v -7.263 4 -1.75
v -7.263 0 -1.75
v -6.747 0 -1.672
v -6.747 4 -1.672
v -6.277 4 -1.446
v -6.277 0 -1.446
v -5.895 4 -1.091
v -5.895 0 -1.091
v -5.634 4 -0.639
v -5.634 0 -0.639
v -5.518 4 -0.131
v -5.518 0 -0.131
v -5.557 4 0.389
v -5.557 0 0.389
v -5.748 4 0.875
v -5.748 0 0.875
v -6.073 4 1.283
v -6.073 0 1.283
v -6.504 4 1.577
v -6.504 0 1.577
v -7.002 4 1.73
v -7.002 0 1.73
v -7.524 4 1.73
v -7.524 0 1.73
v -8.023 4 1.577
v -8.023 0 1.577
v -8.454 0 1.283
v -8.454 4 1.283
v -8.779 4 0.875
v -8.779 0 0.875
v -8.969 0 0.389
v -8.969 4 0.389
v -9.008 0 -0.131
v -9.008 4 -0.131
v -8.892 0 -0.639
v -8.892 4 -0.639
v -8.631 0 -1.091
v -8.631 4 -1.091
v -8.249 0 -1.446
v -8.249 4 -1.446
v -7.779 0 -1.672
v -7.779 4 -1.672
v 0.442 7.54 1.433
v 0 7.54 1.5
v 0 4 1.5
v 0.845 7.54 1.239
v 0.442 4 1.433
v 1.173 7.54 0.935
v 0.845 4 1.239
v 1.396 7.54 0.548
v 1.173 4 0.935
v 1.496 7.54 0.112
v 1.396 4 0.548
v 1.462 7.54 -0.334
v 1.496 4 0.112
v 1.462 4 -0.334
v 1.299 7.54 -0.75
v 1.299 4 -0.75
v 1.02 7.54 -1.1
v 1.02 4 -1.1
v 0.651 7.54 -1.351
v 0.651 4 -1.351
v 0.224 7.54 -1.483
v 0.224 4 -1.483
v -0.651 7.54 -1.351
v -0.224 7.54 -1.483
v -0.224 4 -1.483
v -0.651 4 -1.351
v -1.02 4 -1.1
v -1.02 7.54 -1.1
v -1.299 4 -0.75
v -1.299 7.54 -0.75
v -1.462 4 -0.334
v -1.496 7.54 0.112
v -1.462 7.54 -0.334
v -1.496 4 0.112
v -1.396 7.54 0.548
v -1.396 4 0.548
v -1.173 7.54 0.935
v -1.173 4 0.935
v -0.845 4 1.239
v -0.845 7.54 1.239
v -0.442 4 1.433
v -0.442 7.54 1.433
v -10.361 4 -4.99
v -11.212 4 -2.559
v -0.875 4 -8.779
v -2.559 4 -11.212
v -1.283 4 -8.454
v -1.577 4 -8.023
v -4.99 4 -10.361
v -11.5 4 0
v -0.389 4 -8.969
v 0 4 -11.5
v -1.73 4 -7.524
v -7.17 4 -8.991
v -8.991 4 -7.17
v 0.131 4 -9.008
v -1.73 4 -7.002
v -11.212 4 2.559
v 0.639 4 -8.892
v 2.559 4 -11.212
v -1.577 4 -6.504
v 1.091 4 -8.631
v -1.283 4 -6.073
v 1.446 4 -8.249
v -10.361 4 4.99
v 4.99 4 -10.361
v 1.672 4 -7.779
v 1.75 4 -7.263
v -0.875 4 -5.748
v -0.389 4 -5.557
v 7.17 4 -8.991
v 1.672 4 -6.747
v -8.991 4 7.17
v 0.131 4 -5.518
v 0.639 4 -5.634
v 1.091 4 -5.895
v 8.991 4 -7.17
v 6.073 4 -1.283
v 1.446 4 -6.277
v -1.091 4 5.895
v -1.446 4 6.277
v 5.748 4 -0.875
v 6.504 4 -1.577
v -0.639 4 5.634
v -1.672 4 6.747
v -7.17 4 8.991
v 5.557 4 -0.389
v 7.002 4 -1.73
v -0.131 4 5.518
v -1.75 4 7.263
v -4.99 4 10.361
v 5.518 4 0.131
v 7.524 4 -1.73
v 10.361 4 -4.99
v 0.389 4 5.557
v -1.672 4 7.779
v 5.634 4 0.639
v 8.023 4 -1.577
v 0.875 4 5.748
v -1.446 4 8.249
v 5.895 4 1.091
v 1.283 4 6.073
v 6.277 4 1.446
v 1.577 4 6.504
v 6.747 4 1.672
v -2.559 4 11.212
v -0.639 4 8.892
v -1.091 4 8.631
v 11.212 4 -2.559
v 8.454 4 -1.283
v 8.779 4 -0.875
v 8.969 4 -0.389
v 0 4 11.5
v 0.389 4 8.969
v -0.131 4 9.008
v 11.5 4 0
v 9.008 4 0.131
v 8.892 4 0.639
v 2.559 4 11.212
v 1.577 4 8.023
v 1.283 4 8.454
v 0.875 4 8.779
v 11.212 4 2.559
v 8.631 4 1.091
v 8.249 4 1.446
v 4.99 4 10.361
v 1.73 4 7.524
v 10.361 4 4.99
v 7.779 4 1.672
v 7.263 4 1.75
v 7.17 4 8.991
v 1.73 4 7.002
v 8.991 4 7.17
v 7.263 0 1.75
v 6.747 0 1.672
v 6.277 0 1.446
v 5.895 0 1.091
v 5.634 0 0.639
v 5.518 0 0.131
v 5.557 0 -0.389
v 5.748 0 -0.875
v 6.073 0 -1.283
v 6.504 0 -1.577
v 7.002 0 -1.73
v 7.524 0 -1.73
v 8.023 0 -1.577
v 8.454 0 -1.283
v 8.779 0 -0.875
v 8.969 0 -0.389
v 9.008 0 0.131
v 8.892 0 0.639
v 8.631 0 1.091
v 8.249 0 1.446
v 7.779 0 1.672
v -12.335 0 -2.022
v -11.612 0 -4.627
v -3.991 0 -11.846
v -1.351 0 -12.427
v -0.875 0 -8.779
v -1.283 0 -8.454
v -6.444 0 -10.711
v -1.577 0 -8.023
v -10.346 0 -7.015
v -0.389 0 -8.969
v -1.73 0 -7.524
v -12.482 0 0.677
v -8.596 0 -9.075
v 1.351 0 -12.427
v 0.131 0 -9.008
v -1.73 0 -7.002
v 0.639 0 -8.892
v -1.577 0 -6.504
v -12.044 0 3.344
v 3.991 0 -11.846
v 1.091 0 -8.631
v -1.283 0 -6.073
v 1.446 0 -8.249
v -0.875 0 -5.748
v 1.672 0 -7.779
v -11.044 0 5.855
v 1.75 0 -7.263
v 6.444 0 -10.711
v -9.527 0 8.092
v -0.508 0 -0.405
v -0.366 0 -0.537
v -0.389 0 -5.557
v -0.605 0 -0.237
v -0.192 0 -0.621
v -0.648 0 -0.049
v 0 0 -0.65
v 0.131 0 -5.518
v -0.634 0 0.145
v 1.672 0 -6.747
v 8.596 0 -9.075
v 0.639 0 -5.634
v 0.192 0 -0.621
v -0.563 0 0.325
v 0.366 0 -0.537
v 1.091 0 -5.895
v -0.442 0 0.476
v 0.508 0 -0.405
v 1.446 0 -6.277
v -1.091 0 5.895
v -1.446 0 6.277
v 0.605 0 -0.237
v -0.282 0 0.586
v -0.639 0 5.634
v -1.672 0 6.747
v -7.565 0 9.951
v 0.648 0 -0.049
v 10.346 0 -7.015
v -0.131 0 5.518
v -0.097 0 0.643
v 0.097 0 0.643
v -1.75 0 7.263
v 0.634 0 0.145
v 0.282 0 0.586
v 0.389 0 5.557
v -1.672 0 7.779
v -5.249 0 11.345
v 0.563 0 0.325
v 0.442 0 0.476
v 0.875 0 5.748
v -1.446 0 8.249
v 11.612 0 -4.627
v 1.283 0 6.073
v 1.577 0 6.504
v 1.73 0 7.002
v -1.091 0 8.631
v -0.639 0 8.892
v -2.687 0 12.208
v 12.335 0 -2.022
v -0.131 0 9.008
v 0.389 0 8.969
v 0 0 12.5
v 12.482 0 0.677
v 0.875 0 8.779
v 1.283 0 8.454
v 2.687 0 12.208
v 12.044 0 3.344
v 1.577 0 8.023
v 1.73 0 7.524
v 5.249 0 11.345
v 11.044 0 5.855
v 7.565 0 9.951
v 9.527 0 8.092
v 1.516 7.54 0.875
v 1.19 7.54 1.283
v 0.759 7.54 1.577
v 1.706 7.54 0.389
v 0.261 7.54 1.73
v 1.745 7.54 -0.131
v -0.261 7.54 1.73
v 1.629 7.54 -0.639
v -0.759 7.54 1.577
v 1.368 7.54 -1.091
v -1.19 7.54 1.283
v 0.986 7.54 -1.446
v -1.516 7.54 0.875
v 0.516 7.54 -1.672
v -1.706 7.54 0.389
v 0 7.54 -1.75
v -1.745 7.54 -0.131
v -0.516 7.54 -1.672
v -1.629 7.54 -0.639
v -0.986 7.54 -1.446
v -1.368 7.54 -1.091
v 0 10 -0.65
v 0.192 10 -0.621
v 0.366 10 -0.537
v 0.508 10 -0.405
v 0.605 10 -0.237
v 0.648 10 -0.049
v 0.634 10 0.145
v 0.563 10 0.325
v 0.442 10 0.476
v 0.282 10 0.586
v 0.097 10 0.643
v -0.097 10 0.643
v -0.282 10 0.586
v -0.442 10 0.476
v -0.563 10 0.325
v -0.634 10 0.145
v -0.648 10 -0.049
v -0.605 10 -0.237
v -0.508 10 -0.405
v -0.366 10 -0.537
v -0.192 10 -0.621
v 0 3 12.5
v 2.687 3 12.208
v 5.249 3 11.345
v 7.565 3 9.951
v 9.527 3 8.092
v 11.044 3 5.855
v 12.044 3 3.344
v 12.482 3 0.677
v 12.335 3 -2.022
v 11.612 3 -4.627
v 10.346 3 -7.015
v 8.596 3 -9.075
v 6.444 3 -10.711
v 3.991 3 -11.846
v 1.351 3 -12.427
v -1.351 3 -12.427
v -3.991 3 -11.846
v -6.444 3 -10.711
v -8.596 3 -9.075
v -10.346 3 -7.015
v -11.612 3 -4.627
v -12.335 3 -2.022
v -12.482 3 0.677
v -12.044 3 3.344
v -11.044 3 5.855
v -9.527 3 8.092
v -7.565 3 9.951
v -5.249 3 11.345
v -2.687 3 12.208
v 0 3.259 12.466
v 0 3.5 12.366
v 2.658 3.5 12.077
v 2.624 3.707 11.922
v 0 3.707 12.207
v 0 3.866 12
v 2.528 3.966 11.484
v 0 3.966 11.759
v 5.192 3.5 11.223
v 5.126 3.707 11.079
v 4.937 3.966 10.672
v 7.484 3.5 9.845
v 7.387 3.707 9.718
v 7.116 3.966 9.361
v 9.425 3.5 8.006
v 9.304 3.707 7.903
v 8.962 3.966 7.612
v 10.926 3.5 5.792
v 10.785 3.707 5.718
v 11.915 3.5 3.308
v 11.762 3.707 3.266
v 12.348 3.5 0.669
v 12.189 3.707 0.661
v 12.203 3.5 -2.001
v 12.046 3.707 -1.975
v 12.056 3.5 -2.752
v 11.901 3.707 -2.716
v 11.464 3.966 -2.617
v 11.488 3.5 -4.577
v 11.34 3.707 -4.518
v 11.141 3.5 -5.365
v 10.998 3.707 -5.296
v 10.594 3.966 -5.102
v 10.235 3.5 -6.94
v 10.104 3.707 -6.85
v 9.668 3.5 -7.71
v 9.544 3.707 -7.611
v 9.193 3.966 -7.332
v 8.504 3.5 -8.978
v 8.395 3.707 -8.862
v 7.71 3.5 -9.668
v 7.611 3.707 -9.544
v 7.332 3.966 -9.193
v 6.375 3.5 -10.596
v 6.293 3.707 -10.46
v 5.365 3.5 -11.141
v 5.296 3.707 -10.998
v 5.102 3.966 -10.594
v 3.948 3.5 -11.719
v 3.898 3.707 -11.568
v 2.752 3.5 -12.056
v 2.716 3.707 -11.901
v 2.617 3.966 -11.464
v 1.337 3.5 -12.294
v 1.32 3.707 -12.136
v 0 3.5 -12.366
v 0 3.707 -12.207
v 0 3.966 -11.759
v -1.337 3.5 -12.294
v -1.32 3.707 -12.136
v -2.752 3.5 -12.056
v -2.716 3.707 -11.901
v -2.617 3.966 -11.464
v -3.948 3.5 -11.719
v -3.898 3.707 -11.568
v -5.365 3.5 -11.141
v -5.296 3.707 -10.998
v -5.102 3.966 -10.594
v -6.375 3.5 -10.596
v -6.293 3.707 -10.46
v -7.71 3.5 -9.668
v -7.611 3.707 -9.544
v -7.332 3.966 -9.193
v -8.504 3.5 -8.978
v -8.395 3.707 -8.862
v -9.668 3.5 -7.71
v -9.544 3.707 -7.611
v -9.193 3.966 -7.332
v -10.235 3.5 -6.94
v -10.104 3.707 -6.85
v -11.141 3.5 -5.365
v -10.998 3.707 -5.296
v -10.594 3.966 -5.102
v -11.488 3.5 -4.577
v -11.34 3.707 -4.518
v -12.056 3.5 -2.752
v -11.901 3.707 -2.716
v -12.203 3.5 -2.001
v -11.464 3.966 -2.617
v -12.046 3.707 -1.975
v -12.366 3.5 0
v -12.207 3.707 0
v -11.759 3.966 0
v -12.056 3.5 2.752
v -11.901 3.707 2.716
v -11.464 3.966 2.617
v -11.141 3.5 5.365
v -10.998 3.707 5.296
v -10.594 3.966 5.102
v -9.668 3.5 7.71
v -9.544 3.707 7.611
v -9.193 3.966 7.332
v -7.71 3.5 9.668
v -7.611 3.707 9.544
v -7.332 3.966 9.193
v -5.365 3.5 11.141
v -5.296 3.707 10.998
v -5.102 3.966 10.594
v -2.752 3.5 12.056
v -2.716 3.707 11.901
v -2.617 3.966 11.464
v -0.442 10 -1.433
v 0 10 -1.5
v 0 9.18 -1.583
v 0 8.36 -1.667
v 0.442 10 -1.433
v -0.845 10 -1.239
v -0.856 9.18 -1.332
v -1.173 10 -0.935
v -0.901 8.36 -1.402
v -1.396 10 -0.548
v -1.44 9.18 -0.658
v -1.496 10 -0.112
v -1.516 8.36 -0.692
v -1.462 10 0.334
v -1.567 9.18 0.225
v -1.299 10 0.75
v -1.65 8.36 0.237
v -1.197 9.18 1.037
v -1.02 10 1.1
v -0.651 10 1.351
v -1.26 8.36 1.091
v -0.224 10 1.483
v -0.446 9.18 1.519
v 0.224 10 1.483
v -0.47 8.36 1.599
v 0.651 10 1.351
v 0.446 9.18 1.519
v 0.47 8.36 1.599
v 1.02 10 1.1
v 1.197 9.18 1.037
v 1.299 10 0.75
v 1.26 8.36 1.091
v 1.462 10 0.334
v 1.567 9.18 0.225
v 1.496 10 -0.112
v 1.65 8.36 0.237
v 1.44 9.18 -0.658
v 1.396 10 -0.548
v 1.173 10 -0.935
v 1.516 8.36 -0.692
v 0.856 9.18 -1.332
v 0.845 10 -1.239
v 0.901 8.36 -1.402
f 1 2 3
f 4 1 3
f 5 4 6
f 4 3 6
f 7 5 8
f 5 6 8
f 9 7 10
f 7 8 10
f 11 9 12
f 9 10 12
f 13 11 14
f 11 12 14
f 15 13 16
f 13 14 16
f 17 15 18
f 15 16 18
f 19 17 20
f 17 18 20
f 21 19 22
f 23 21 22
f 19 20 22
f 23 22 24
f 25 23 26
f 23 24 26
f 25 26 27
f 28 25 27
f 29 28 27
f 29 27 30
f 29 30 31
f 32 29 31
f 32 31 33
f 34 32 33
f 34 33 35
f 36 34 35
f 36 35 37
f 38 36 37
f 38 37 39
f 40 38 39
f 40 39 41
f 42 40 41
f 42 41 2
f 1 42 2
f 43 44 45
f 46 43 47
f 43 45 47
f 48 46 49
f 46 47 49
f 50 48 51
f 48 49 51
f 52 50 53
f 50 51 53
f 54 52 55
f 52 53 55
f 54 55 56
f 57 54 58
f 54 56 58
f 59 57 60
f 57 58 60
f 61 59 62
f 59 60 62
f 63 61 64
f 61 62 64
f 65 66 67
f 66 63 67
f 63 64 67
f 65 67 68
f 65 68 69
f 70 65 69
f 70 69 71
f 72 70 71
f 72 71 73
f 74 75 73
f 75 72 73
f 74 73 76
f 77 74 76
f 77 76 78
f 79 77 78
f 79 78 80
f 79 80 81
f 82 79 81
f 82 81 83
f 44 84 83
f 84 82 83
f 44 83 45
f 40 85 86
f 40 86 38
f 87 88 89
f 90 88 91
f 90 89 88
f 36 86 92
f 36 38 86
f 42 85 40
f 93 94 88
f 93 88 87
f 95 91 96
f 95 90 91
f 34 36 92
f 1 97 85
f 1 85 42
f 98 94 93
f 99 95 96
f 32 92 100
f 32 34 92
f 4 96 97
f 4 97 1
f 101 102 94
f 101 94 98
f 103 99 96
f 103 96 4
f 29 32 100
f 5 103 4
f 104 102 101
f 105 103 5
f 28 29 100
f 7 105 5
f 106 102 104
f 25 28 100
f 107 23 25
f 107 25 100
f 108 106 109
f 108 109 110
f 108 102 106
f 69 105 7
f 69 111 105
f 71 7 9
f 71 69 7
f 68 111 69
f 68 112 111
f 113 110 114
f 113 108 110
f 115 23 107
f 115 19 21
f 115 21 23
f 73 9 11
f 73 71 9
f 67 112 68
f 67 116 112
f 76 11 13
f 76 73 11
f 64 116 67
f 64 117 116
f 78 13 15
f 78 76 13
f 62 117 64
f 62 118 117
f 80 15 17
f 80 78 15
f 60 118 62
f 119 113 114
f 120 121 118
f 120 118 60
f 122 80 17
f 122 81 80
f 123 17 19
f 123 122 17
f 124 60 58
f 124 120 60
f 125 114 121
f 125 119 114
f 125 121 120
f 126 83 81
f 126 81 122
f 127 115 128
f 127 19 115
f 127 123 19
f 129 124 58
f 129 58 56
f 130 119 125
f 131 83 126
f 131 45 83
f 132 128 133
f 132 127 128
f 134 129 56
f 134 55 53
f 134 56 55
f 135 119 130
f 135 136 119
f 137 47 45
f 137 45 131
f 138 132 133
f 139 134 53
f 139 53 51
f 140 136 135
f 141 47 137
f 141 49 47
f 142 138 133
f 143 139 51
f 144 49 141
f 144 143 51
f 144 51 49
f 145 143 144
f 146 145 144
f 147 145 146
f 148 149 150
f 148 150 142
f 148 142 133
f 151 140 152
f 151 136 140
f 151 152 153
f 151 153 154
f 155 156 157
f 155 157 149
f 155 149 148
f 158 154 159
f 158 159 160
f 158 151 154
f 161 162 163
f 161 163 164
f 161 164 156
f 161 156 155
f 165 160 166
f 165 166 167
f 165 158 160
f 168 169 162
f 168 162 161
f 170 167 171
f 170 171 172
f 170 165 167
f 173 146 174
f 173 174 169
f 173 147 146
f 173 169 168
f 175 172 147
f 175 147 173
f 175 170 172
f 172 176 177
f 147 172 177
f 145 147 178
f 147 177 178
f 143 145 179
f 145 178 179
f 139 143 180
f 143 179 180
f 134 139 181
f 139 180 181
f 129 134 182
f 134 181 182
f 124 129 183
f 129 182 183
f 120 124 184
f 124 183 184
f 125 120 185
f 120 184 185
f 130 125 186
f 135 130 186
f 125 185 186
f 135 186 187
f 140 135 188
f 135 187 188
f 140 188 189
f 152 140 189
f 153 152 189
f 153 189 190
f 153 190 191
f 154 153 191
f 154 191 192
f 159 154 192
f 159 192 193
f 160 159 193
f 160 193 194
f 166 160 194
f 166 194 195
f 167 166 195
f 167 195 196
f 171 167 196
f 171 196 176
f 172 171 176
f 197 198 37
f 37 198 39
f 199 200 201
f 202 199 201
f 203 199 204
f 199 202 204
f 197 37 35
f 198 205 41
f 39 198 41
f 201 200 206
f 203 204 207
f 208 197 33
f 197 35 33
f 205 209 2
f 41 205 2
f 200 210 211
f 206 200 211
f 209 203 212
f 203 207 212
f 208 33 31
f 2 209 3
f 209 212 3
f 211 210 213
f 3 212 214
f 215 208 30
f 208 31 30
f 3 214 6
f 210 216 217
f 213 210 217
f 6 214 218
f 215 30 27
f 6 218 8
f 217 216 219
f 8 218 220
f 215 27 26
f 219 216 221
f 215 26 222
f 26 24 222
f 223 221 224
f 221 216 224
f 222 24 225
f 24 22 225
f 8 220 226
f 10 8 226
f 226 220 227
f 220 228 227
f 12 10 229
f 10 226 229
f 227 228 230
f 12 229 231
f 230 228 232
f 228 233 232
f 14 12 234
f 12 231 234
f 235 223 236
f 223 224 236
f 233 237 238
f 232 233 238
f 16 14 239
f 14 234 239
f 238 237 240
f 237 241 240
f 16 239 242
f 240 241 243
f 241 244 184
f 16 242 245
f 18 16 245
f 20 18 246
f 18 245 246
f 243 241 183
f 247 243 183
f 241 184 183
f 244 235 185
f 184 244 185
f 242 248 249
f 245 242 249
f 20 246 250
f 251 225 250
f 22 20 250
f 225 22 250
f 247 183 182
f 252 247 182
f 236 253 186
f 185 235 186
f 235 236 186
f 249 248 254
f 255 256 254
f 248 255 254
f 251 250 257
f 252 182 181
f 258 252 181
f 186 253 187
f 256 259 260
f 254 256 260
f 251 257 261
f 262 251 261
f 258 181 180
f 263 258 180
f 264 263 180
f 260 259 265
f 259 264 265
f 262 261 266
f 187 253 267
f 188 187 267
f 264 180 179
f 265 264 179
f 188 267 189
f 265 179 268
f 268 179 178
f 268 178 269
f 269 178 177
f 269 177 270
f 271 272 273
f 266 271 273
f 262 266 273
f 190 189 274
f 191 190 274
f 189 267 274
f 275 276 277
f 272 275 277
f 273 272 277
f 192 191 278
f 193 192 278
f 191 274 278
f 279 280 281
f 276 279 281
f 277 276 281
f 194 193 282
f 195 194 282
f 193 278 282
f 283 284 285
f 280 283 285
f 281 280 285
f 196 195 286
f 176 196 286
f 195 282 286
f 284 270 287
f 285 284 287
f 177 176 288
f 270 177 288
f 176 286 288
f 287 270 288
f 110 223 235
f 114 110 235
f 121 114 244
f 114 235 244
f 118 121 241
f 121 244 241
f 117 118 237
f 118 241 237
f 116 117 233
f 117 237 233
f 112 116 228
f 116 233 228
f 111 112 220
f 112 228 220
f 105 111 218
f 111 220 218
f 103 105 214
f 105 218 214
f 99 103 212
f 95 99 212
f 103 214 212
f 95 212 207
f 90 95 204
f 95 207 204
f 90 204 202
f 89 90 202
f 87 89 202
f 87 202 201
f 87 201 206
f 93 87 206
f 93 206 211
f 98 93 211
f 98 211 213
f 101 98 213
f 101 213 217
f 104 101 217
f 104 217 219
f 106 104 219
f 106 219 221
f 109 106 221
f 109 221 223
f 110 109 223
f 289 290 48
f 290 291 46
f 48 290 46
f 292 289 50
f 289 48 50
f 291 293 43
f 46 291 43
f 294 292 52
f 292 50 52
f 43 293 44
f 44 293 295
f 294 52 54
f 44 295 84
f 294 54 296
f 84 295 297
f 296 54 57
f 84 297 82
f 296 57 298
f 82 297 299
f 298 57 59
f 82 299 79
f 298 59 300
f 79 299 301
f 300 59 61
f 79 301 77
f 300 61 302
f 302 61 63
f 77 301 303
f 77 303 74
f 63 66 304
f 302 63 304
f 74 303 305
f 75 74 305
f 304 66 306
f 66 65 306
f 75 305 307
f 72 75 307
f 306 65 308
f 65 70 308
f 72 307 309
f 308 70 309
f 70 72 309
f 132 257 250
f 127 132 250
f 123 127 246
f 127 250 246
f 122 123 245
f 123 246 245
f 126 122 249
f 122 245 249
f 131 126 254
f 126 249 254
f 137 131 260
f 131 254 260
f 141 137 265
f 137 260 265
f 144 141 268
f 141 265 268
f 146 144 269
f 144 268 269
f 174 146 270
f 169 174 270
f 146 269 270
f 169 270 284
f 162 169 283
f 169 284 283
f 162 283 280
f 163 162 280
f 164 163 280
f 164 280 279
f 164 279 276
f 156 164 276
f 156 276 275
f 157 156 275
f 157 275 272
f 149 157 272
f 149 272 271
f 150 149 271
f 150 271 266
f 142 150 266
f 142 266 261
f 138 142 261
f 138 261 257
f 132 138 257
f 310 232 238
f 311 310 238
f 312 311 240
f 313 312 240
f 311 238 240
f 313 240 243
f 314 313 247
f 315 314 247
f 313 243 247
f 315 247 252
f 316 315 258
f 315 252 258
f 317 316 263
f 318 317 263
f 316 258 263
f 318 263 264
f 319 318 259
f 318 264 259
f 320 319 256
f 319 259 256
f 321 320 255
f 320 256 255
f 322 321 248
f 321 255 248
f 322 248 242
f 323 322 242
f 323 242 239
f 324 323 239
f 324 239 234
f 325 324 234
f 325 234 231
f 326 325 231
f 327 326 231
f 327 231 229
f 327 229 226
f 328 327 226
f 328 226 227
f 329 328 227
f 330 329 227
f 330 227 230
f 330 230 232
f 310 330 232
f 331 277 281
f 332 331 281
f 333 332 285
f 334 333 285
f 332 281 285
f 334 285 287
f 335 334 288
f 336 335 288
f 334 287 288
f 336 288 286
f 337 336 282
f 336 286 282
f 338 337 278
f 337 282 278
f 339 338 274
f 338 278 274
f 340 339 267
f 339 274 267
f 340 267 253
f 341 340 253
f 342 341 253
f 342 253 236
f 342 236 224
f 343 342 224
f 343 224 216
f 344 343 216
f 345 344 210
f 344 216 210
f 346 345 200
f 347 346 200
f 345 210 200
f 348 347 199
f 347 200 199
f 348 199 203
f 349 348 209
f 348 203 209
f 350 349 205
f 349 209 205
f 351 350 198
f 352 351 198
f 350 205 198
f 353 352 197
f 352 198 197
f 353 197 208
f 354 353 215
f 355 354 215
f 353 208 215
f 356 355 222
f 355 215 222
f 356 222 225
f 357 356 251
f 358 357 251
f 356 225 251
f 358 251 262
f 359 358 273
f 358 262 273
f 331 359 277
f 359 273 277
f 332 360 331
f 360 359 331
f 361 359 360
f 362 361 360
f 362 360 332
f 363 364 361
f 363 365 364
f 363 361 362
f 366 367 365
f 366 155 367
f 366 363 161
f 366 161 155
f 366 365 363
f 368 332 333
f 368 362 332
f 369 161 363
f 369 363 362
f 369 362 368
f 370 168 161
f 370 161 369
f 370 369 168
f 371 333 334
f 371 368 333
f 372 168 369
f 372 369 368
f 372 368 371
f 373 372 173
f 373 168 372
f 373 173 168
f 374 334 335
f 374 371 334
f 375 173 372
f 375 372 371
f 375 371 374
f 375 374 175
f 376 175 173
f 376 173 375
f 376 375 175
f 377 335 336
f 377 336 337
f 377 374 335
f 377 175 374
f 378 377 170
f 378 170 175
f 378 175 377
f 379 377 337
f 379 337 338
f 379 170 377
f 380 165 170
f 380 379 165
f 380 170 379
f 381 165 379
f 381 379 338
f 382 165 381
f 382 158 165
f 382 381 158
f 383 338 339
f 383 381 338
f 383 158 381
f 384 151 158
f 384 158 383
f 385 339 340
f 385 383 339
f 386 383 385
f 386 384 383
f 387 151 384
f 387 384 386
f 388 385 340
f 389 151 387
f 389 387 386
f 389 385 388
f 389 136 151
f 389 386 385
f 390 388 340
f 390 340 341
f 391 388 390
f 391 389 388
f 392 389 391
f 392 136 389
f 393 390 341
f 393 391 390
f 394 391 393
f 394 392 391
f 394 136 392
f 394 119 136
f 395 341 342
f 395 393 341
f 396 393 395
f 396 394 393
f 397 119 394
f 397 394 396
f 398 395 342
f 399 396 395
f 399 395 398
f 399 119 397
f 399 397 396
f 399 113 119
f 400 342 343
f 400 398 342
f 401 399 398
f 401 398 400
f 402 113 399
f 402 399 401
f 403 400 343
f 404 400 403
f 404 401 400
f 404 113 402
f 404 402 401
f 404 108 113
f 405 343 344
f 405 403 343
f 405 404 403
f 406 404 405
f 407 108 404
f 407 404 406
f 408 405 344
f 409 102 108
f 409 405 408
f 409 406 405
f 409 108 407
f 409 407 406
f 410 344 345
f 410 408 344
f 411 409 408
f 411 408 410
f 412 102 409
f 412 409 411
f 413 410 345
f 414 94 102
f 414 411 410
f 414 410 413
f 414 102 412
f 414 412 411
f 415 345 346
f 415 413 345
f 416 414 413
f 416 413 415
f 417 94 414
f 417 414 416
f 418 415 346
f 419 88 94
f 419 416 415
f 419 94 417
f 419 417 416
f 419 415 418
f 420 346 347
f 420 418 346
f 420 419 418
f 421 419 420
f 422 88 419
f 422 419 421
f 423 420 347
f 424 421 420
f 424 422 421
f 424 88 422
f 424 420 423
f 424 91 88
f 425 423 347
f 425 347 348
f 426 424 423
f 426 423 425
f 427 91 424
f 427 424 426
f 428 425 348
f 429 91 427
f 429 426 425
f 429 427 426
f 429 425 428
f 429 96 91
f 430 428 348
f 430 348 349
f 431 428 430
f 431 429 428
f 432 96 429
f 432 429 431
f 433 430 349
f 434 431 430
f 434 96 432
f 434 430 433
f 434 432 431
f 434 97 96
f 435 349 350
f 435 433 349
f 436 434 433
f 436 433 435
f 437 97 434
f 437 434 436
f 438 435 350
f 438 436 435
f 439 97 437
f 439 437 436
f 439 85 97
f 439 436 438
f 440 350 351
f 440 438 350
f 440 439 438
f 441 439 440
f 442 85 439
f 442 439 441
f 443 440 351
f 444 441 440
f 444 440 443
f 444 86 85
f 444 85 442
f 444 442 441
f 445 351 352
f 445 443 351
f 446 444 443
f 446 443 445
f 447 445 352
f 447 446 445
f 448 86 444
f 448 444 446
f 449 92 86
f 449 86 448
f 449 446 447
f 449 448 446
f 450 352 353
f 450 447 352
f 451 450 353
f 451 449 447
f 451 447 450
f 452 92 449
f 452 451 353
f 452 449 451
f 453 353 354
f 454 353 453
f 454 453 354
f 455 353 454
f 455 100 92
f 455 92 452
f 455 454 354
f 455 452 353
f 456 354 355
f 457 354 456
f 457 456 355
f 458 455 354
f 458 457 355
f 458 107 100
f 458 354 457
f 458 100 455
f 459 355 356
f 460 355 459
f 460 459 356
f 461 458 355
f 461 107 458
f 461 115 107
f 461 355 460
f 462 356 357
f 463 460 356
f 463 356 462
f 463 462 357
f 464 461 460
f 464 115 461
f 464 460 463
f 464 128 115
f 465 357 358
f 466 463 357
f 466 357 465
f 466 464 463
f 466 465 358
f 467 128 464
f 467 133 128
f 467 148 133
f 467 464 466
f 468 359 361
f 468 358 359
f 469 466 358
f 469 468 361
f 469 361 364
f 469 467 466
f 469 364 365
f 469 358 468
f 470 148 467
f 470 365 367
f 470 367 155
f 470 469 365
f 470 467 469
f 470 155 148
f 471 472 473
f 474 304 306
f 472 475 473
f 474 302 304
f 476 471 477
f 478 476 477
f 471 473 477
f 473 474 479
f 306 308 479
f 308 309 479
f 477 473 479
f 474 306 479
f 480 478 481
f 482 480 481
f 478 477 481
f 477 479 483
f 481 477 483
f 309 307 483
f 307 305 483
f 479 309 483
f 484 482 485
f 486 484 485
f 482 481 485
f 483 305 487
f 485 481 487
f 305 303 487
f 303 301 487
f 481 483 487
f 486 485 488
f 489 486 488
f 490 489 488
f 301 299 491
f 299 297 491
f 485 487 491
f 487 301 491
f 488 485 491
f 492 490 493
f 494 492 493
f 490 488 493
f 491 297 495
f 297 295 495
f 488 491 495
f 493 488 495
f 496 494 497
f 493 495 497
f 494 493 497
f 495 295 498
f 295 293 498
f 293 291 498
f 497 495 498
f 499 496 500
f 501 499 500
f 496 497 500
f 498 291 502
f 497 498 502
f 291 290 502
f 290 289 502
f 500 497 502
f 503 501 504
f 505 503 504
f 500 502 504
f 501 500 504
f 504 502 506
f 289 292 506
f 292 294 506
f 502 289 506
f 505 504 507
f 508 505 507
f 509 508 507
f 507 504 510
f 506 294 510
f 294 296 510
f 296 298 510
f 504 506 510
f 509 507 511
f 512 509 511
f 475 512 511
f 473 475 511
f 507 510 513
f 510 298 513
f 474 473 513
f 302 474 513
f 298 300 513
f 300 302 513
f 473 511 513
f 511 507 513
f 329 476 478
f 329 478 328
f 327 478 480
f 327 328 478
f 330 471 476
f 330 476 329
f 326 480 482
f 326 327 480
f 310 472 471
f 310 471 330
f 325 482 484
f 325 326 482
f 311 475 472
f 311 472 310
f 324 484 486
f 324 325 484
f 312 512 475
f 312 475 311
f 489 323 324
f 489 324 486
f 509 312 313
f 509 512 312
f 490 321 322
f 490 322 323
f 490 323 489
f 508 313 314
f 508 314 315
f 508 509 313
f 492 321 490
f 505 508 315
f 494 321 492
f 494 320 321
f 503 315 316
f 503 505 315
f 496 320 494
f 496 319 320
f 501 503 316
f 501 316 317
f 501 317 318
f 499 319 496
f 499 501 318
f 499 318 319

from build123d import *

# Parameters (mm, degrees)
SKETCH1_R           = 12.5
BOSS_EXTRUDE1_DEPTH = 4
SKETCH2_R           = 1.5
BOSS_EXTRUDE2_DEPTH = 6
FILLET1_R           = 1
CUT_EXTRUDE1_REACH  = 22.31
SKETCH6_R           = 0.65
CUT_EXTRUDE2_REACH  = 22.31
SKETCH7_R           = 1.75
CIRPATTERN1_COUNT   = 4


with BuildPart() as part:
    # Sketch1 → Boss-Extrude1 (new body)
    with BuildSketch(Plane(origin=(0, 0, 0), x_dir=(1, 0, 0), z_dir=(0, 1, 0))):
        with Locations(Location((0, 0, 0), (0, 0, 270))):
            Circle(SKETCH1_R)
    extrude(amount=BOSS_EXTRUDE1_DEPTH)

    # Sketch2 → Boss-Extrude2 (add)
    with BuildSketch(Plane(origin=(0, 4, 0), x_dir=(1, 0, 0), z_dir=(0, 1, 0))):
        with Locations(Location((0, 0, 0), (0, 0, 270))):
            Circle(SKETCH2_R)
    extrude(amount=BOSS_EXTRUDE2_DEPTH)

    # Fillet1
    fillet1_edges = [part.edges().sort_by_distance(p)[0] for p in [
        (0, 4, -12.5),
    ]]
    fillet(fillet1_edges, radius=FILLET1_R)

    # Sketch5 → Revolve1 (revolve)
    with BuildSketch(Plane.XY, mode=Mode.PRIVATE) as revolve1_sk:
        Polygon((0, 7.54), (0, 10), (1.5, 10), (1.75, 7.54), align=None)
    revolve(revolve1_sk.sketch.rotate(Axis((0, 7.54, 0), (0, 1, 0)), 90), axis=Axis((0, 7.54, 0), (0, 1, 0)))

    # Sketch6 → Cut-Extrude1 (cut, up to next)
    with BuildSketch(Plane.XZ, mode=Mode.PRIVATE) as cut_extrude1_sk1:
        with Locations(Location((0, 0, 0), (0, 0, 270))):
            Circle(SKETCH6_R)
    cut_extrude1_tool1 = extrude(cut_extrude1_sk1.sketch, amount=-CUT_EXTRUDE1_REACH, mode=Mode.PRIVATE) & part.part
    add(cut_extrude1_tool1.solids().sort_by_distance((0, 0, 0))[0], mode=Mode.SUBTRACT)

    # Sketch7 → Cut-Extrude2 (cut, up to next)
    with BuildSketch(Plane.XZ, mode=Mode.PRIVATE) as cut_extrude2_sk1:
        with Locations(Location((-7.263210785, 0, 0), (0, 0, 270))):
            Circle(SKETCH7_R)
    cut_extrude2_tool1 = extrude(cut_extrude2_sk1.sketch, amount=-CUT_EXTRUDE2_REACH, mode=Mode.PRIVATE) & part.part
    cut_extrude2 = cut_extrude2_tool1.solids().sort_by_distance((-7.263211, 0, 0))[0]
    add(cut_extrude2, mode=Mode.SUBTRACT)

    # CirPattern1: Cut-Extrude2 ×4 about axis
    cirpattern1_axis = Axis((0, 0, 0), (0, 1, 0))
    for i in range(1, CIRPATTERN1_COUNT):
        add(cut_extrude2.rotate(cirpattern1_axis, i * 360 / CIRPATTERN1_COUNT), mode=Mode.SUBTRACT)


solid = part.part
